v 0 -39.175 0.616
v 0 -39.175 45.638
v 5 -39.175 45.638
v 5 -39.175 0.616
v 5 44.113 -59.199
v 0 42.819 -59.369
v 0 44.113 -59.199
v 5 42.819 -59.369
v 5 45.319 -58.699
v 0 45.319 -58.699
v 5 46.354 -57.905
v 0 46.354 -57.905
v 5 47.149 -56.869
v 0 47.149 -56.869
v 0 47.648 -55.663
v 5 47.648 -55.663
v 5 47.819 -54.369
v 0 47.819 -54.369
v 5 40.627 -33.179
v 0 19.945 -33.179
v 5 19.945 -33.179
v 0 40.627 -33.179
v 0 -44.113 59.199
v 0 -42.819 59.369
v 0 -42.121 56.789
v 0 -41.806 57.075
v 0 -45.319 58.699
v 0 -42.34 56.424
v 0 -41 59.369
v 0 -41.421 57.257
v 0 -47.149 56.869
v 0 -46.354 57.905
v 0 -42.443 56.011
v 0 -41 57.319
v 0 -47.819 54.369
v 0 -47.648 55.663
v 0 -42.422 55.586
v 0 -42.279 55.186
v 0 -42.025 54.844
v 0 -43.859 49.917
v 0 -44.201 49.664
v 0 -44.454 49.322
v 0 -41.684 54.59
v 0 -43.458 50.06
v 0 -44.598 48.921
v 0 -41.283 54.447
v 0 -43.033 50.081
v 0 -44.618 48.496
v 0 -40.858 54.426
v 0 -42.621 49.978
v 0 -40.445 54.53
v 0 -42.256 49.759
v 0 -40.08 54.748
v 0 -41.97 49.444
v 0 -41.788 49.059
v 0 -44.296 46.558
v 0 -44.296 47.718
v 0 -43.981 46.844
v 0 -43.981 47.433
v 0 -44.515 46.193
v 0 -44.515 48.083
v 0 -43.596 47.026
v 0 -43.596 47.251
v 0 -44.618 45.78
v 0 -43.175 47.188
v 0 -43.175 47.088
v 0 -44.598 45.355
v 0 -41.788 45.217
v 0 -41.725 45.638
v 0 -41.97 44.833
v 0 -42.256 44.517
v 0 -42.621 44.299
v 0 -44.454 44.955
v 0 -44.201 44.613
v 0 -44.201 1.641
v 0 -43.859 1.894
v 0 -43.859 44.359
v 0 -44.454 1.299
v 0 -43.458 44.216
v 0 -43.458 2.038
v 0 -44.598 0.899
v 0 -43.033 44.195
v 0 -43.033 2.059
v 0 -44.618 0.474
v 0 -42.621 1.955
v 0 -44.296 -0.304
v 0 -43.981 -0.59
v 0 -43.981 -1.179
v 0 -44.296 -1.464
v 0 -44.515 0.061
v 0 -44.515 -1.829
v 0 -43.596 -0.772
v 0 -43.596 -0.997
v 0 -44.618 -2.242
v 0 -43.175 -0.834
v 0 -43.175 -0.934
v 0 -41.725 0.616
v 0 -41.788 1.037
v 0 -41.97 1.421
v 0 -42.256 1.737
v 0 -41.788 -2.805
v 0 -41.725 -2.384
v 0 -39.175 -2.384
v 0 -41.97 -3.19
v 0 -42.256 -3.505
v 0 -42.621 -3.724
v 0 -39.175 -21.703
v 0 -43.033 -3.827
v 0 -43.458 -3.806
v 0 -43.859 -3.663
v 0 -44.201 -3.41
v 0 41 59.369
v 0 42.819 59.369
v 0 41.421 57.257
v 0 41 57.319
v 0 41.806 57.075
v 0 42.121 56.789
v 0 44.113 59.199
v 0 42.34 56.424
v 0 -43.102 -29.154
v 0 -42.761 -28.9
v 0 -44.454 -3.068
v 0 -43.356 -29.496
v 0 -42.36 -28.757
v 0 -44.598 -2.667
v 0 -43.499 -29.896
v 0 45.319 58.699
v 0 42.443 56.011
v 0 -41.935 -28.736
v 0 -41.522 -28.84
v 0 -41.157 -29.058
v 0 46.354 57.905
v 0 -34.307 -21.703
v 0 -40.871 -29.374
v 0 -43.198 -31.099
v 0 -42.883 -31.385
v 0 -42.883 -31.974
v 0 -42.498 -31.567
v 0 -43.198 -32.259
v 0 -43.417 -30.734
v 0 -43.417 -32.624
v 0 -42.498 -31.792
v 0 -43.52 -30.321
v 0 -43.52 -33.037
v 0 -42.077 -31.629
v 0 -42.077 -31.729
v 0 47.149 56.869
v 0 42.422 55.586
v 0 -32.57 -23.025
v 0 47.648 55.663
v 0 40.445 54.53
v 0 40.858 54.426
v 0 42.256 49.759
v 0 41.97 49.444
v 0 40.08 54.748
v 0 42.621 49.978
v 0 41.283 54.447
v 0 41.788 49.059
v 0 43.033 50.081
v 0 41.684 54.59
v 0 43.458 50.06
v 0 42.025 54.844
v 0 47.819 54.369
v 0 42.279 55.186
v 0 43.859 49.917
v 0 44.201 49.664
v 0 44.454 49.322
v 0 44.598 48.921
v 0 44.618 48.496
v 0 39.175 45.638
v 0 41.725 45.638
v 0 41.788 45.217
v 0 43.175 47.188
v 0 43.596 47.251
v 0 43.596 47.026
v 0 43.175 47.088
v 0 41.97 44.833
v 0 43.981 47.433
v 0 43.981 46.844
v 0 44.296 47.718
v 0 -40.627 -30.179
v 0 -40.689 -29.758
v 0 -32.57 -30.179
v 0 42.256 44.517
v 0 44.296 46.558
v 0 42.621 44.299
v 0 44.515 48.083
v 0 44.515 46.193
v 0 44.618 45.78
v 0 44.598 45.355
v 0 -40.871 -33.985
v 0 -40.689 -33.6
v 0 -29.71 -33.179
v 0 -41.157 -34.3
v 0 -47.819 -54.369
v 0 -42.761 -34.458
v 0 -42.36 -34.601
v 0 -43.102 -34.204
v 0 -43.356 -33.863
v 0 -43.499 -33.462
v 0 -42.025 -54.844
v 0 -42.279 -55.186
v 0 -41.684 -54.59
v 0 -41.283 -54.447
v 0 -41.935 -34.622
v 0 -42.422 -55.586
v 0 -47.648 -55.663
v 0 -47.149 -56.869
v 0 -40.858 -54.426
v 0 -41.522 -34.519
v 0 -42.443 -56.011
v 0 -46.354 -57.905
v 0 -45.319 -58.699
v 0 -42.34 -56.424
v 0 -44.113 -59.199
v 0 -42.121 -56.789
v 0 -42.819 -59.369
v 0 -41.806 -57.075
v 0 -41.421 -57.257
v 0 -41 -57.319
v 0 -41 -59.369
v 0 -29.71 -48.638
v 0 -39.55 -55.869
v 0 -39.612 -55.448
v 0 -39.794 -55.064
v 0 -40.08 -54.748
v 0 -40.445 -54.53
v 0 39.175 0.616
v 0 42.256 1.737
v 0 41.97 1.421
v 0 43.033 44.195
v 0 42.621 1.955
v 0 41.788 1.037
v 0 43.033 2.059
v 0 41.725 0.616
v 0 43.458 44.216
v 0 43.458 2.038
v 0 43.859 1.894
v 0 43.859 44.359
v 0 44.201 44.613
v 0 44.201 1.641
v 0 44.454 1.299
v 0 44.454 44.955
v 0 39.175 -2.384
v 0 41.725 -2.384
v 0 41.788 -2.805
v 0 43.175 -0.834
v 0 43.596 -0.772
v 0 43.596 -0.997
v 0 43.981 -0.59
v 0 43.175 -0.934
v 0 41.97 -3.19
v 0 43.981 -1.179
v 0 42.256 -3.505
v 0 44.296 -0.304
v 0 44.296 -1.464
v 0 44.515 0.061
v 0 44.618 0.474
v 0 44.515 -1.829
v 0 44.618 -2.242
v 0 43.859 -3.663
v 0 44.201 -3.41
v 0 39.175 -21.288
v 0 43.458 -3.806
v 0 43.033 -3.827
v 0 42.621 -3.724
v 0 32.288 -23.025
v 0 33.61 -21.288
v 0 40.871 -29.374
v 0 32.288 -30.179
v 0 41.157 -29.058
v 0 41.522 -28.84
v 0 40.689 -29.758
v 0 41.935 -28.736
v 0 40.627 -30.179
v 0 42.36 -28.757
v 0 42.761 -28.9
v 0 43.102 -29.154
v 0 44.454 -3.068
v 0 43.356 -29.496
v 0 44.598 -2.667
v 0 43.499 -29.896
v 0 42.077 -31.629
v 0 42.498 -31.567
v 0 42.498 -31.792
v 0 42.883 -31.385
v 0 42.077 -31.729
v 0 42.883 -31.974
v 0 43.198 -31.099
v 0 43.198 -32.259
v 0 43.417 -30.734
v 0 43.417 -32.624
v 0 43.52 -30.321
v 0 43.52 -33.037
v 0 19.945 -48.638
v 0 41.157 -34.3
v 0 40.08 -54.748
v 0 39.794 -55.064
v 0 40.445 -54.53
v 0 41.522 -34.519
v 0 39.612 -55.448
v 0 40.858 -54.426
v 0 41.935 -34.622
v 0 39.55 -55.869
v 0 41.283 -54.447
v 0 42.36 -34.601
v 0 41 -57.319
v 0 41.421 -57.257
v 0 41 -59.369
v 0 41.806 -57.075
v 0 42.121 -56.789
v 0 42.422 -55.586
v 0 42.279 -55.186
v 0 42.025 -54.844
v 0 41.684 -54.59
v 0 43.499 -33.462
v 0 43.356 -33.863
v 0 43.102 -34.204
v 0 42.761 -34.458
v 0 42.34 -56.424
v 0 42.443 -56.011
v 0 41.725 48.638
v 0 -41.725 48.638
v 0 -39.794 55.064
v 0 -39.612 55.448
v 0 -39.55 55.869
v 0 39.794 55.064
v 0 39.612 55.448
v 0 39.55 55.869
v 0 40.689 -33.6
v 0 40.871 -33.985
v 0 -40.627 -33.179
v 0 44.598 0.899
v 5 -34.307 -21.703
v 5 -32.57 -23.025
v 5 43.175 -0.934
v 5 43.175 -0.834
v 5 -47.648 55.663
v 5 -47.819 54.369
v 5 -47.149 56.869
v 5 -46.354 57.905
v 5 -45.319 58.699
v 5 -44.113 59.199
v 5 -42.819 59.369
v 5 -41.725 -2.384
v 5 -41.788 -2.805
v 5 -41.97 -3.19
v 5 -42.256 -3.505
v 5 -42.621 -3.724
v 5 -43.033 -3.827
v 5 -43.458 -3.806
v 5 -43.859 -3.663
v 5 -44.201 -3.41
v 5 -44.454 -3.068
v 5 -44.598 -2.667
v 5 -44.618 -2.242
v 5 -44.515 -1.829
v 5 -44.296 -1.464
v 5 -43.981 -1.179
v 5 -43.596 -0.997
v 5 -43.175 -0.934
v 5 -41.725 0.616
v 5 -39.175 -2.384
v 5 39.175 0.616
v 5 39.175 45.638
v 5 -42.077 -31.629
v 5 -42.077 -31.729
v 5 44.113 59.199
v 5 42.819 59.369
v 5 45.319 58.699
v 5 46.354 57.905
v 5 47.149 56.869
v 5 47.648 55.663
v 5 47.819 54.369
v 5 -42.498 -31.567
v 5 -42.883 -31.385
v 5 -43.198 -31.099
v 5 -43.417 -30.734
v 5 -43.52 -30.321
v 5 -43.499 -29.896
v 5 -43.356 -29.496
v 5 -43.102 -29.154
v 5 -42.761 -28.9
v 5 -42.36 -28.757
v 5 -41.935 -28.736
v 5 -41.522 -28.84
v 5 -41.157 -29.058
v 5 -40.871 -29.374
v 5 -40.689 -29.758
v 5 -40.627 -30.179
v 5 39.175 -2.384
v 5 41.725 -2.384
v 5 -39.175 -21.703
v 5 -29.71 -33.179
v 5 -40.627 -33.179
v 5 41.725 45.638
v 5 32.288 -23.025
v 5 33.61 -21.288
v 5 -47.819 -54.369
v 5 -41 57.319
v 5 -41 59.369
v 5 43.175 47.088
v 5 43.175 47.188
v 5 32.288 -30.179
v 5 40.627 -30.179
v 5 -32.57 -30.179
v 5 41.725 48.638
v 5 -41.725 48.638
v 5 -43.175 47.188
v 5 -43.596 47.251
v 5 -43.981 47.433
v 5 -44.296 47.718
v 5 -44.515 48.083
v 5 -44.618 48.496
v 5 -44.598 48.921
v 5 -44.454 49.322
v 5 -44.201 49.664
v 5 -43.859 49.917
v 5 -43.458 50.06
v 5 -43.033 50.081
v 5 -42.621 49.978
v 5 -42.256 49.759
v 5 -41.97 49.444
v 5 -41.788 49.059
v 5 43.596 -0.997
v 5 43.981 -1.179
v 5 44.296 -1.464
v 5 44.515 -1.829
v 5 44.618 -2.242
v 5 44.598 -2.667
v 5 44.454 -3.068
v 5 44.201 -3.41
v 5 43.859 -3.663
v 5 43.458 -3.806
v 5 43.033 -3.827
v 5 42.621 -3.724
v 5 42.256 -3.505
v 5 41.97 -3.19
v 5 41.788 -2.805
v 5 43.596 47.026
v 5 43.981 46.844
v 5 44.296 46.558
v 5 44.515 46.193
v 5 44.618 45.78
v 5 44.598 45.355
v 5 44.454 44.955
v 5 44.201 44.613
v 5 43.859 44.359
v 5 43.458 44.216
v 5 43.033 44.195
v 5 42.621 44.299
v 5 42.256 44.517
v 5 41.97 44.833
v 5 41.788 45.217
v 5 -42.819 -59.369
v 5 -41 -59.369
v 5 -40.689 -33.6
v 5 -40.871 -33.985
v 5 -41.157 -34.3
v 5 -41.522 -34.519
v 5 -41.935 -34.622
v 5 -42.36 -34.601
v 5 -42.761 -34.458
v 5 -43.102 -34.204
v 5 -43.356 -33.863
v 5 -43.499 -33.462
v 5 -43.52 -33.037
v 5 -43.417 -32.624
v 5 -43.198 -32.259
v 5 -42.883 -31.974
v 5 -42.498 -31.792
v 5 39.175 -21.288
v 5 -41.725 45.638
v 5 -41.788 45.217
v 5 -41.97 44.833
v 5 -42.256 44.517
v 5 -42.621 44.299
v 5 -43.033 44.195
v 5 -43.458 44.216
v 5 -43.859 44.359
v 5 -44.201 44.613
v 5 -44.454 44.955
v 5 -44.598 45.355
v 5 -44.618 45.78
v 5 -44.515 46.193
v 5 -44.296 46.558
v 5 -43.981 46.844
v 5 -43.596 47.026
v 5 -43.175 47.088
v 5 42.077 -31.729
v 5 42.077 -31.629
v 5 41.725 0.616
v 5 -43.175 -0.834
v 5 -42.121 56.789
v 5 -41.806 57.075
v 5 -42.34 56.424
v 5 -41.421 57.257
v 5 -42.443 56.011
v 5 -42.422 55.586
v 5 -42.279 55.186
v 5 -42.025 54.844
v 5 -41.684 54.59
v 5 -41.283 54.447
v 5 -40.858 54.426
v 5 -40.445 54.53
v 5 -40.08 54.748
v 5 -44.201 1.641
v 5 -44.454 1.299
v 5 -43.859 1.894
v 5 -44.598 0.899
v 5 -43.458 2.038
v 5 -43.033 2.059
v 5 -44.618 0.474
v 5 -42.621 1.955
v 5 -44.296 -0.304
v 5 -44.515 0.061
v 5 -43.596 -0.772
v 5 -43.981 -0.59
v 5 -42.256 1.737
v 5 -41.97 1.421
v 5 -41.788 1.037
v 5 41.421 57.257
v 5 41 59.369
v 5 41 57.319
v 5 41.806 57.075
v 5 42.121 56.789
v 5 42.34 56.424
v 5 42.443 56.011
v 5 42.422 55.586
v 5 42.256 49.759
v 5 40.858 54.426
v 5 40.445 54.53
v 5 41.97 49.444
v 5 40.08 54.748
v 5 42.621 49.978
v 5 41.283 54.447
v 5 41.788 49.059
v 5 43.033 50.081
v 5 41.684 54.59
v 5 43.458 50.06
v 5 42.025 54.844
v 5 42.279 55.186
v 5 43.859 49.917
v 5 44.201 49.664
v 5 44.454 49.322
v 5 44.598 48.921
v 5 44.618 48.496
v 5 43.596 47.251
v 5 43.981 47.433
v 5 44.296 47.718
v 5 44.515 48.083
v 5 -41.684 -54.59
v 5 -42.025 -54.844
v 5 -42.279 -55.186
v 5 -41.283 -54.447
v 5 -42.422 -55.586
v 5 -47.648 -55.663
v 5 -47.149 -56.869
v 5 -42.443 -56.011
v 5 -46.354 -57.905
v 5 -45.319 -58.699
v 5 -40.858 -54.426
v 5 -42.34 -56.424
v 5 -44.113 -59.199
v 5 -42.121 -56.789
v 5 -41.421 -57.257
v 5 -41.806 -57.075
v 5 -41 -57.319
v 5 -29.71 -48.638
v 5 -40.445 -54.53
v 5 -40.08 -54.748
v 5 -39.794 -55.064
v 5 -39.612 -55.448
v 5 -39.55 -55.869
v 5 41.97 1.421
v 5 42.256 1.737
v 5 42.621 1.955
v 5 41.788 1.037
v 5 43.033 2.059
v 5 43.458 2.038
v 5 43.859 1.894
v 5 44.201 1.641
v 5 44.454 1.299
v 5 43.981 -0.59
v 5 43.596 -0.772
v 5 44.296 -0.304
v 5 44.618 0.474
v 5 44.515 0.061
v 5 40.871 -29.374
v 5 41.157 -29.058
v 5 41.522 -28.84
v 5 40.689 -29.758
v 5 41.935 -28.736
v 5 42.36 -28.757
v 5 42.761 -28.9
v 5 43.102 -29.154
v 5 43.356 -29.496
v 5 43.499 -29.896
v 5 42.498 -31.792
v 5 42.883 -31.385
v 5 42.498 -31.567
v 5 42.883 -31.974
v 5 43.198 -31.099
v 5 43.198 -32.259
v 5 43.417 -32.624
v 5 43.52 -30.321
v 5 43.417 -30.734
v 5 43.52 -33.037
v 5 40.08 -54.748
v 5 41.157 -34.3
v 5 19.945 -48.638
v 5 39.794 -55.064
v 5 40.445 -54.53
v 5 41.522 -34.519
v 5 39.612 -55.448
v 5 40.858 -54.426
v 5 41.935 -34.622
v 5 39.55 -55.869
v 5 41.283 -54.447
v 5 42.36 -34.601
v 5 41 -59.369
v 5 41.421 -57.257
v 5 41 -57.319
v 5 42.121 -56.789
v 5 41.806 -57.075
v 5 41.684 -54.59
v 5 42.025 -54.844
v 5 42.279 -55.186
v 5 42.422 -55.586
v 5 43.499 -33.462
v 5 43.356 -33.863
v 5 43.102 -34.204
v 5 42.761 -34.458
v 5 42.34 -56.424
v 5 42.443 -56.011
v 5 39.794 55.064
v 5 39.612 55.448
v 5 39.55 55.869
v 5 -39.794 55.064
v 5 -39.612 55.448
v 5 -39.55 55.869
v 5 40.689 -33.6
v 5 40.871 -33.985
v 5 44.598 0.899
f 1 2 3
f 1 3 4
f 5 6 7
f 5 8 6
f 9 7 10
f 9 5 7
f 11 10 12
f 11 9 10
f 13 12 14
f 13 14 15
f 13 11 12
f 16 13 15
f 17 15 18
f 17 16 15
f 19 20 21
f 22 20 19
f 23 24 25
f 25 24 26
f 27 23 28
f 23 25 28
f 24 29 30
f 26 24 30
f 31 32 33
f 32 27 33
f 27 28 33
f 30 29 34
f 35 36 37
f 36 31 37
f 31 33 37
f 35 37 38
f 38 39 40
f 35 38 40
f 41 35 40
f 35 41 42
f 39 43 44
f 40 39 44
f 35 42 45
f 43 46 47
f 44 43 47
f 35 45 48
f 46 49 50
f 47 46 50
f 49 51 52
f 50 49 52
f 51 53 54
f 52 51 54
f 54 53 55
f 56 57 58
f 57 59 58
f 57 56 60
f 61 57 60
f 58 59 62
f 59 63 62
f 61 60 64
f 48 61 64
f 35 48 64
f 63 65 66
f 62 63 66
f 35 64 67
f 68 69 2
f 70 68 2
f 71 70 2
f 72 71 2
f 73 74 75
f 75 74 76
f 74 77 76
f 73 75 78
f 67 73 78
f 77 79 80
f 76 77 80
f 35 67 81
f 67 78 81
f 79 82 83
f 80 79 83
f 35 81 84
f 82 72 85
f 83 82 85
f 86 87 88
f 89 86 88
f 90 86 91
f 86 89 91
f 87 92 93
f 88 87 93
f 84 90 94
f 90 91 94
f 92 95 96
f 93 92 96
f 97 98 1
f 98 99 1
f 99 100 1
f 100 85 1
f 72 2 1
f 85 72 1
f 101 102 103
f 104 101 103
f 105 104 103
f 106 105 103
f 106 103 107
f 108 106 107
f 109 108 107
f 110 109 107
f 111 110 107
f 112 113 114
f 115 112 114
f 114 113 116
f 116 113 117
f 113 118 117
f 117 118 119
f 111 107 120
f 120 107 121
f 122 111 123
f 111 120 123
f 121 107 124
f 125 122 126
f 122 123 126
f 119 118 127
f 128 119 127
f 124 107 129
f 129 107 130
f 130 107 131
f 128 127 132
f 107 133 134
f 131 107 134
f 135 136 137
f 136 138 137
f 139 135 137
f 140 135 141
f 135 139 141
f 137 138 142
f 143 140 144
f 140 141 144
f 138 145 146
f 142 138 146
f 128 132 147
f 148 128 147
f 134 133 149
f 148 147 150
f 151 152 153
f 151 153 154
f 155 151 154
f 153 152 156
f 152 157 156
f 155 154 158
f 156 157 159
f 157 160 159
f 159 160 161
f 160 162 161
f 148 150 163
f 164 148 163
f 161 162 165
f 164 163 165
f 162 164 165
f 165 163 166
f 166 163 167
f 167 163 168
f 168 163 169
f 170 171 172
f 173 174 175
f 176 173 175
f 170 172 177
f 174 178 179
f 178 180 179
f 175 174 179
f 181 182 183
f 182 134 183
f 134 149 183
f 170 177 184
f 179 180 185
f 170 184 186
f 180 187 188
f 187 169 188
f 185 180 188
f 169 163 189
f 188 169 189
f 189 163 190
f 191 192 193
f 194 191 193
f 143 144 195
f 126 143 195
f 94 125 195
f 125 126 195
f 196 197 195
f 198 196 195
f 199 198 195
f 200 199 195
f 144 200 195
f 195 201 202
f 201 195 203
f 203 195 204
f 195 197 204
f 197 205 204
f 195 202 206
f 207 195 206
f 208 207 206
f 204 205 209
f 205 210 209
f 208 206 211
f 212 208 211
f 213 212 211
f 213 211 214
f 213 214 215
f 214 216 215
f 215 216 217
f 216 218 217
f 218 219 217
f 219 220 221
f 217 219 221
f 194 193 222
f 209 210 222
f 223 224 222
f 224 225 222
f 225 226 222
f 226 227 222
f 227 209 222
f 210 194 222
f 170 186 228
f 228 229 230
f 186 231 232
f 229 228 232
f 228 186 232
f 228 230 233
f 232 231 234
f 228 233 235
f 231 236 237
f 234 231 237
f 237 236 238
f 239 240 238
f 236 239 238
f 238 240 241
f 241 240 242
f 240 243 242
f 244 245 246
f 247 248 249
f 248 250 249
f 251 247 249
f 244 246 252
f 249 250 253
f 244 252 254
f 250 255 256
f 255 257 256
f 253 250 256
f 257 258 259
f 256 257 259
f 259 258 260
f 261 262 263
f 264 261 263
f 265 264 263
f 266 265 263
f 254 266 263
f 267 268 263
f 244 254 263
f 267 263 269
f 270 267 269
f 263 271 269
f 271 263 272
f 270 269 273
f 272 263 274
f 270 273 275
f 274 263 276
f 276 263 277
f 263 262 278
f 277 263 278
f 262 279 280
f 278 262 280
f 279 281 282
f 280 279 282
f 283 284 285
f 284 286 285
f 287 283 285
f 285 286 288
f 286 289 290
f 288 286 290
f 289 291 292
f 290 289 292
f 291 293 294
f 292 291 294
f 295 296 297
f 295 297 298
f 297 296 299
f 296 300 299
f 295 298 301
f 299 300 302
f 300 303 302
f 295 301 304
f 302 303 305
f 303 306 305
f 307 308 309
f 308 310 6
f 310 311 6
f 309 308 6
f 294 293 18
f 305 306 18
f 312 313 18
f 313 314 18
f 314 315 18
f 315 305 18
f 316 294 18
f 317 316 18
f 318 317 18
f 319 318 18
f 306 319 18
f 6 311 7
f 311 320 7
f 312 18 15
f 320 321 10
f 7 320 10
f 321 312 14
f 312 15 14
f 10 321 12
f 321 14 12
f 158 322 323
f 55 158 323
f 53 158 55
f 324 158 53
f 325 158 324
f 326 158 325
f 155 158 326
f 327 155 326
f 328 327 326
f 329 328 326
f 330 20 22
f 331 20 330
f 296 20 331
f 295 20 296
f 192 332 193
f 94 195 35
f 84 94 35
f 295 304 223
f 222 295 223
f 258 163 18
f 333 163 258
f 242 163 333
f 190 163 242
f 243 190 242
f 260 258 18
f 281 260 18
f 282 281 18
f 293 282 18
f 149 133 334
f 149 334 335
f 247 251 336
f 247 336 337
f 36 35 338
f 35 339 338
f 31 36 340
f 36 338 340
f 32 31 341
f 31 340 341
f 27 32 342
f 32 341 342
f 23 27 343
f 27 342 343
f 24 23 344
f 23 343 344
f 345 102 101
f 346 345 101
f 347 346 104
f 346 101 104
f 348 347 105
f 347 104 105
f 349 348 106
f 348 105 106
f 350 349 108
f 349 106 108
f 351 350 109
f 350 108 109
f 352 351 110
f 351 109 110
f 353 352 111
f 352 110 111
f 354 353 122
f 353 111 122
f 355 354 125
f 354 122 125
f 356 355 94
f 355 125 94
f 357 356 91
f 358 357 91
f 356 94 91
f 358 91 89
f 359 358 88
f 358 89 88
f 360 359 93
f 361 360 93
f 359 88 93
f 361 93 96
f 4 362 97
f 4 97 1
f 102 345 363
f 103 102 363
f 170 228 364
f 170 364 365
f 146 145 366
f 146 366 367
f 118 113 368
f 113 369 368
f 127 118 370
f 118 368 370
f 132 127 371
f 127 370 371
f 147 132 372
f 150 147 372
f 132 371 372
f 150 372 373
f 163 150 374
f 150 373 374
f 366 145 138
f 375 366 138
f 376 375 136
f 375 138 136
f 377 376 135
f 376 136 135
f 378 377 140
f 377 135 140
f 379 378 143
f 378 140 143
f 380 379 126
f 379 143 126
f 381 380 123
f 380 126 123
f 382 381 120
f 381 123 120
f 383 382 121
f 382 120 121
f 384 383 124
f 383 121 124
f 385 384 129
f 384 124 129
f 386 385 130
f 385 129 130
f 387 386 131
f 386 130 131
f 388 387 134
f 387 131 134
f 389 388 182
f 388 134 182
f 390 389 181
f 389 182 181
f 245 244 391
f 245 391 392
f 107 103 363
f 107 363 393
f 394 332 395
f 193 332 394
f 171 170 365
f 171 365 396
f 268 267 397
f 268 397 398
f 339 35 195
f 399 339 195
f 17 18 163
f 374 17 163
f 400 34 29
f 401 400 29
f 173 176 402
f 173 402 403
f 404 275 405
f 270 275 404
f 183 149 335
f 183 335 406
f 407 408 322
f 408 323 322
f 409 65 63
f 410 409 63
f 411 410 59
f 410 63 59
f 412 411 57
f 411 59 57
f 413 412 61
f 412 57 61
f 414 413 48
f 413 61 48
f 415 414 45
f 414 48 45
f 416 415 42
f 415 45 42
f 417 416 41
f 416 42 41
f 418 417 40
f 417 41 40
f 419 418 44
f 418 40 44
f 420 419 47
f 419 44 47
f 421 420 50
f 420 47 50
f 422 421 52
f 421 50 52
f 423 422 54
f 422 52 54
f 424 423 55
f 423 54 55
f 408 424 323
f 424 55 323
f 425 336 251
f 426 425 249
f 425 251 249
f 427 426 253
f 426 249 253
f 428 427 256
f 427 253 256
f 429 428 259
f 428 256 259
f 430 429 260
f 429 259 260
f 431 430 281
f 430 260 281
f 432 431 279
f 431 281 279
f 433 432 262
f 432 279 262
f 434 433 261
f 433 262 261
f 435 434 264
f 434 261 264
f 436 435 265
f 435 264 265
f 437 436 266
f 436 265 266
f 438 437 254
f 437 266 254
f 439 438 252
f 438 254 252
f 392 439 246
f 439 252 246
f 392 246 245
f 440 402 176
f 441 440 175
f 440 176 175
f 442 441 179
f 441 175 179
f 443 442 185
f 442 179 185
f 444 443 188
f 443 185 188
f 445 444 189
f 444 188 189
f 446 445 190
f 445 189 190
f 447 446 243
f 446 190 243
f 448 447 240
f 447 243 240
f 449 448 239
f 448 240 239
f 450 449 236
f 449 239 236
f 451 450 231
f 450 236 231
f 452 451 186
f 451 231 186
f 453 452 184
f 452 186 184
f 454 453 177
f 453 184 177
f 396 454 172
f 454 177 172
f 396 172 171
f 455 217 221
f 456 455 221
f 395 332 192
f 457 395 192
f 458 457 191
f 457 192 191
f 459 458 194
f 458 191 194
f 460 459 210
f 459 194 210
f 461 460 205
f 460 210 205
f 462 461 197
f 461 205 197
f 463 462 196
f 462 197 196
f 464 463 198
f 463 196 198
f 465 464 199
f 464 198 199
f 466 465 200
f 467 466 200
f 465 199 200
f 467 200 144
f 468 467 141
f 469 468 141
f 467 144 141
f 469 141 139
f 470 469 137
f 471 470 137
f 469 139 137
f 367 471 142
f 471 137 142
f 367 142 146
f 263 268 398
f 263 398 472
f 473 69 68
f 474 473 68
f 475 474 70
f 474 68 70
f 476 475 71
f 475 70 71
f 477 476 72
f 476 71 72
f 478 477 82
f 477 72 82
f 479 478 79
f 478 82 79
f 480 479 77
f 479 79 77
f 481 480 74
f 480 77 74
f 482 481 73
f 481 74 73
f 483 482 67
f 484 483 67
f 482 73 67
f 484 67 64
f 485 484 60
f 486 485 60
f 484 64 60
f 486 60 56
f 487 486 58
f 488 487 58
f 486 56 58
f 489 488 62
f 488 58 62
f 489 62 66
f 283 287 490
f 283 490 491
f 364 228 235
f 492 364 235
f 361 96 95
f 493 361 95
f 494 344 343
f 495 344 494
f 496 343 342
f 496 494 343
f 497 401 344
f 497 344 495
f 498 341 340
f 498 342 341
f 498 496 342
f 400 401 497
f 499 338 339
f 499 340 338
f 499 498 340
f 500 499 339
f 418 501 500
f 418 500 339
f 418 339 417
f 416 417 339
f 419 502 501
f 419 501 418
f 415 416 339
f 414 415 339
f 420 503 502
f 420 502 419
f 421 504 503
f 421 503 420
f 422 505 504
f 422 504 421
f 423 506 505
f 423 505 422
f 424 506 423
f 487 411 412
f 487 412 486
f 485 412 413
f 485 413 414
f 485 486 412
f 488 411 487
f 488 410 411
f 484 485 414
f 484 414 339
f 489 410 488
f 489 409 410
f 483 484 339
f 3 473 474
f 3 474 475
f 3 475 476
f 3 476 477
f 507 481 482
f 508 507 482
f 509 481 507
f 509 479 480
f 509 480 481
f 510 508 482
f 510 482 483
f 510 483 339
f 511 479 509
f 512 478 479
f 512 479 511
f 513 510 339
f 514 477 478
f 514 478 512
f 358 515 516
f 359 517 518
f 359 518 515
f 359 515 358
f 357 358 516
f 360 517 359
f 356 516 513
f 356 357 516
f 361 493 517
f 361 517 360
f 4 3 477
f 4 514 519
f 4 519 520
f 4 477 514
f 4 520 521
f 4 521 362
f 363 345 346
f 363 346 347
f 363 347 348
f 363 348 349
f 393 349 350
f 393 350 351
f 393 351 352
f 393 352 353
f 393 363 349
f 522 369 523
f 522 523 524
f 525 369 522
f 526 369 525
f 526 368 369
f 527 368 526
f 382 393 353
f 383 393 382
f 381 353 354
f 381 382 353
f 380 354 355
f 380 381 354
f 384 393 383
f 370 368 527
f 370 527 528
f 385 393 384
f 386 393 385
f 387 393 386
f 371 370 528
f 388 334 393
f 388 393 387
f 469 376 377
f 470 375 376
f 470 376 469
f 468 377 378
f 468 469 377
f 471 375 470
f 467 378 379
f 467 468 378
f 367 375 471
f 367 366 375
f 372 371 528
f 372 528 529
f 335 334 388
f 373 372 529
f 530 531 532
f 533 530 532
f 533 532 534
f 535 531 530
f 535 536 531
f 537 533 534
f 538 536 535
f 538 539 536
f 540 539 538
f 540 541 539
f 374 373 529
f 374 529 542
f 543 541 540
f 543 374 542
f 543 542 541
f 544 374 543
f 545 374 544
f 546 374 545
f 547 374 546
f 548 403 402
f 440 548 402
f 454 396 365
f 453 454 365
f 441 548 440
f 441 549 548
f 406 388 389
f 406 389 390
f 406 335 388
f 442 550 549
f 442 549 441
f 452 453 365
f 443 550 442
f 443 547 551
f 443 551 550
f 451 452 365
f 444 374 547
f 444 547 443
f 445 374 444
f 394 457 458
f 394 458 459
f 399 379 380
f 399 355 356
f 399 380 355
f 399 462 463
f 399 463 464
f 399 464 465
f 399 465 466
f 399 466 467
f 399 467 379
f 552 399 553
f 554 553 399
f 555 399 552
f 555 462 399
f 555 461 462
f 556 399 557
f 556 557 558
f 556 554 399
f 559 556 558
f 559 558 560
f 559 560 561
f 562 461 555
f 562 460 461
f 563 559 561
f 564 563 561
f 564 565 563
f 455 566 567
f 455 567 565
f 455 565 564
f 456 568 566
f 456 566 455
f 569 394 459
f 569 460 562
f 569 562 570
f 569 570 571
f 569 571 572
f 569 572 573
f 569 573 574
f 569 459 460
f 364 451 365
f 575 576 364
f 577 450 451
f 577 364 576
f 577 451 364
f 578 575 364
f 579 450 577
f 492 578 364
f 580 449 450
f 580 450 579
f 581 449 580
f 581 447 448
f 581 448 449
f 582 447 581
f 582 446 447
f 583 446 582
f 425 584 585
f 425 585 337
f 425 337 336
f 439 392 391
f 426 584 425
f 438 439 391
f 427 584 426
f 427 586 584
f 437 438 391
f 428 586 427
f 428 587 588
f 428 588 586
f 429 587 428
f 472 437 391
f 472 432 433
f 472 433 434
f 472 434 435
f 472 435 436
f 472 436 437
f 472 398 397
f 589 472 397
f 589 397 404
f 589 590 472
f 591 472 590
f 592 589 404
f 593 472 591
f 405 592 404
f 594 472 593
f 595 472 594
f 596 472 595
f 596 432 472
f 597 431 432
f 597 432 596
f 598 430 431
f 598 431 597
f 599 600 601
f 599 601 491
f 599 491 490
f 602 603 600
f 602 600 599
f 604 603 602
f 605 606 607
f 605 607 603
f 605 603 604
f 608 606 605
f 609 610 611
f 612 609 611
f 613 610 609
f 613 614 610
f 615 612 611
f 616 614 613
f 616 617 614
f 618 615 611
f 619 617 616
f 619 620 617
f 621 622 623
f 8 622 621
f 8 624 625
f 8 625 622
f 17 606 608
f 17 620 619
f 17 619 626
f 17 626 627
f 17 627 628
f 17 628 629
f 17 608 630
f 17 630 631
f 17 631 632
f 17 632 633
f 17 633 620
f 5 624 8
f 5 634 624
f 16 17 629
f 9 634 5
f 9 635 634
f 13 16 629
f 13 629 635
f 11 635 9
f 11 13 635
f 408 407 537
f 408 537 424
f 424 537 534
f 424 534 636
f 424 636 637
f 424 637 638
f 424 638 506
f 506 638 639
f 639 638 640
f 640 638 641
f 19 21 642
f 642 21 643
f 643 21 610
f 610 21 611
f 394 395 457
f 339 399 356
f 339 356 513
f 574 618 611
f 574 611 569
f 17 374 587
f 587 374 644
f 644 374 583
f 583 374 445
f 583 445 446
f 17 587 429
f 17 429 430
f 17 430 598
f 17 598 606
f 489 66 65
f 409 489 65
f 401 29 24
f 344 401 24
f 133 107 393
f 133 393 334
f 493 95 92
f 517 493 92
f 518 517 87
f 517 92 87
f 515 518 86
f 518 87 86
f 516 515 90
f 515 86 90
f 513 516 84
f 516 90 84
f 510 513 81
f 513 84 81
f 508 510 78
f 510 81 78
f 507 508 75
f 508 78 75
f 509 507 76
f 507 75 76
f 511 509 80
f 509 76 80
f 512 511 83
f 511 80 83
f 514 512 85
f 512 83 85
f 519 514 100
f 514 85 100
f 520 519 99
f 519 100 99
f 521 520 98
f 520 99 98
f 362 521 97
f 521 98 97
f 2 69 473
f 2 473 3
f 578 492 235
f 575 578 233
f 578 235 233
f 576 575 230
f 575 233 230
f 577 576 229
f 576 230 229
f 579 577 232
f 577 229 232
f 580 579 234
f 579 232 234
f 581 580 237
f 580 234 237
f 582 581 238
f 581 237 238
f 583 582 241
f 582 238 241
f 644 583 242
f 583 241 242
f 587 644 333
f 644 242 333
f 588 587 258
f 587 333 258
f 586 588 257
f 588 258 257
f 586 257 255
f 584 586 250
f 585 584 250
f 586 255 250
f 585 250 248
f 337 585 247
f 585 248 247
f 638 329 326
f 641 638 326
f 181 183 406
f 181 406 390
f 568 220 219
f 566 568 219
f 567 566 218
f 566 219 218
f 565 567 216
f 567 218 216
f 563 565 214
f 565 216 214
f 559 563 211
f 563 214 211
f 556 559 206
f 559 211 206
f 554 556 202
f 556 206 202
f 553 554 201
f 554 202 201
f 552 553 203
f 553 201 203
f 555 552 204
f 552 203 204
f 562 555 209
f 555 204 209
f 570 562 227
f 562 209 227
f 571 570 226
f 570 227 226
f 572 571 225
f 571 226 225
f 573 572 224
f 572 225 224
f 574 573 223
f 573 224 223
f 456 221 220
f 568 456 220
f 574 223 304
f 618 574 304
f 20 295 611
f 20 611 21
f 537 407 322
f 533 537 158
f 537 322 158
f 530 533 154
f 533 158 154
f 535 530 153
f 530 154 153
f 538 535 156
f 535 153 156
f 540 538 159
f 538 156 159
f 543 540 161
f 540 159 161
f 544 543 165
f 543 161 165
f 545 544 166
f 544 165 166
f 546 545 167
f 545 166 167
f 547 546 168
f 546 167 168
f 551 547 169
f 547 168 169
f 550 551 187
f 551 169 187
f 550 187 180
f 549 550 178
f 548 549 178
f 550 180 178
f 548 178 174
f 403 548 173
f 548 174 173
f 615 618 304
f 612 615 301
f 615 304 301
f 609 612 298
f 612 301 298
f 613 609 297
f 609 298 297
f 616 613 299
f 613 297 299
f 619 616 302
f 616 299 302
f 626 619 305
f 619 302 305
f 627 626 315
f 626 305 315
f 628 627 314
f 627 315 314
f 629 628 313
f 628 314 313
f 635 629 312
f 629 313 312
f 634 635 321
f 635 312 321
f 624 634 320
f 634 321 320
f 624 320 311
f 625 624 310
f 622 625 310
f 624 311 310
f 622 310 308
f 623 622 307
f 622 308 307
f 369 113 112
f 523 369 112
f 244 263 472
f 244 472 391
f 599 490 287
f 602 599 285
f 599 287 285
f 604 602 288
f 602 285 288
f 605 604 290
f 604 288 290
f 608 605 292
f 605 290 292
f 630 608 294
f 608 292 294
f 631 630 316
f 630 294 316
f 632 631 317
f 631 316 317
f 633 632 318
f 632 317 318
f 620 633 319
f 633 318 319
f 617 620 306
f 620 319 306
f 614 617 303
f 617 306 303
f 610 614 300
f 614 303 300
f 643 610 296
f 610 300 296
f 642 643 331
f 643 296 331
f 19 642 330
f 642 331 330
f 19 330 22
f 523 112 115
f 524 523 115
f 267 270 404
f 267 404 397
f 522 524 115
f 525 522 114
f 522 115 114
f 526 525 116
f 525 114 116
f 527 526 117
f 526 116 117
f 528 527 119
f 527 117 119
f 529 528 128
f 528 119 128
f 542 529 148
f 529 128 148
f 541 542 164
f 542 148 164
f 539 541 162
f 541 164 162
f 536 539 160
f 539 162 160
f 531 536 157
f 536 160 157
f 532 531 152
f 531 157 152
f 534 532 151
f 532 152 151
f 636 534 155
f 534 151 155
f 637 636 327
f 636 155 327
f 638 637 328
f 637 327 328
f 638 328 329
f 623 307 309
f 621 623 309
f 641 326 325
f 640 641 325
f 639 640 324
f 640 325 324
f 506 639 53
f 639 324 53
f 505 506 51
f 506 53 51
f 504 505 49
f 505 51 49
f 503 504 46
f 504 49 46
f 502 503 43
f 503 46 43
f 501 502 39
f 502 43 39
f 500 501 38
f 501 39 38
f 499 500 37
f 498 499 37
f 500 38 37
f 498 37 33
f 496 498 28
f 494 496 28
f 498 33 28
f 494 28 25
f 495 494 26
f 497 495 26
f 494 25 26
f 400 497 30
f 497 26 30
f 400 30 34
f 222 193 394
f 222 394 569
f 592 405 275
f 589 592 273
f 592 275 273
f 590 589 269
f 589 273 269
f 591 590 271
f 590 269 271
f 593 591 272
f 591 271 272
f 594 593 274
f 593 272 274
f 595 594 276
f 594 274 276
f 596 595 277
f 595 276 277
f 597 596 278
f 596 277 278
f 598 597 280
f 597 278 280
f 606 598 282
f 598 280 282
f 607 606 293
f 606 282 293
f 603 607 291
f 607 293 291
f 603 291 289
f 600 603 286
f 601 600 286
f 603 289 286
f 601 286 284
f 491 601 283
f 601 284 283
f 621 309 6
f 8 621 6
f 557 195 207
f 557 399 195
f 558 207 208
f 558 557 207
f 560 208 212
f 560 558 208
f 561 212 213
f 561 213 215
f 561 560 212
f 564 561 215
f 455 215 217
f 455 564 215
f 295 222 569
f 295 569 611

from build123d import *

# Parameters (mm, degrees)
BOSS_EXTRUDE1_DEPTH = 5
FILLET1_R           = 5
CUT_EXTRUDE1_REACH  = 7
SKETCH2_W           = 3
SKETCH2_H           = 4
CUT_EXTRUDE2_REACH  = 7
SKETCH3_R           = 1.45


with BuildPart() as part:
    # Sketch1 → Boss-Extrude1 (new body)
    with BuildSketch(Plane(origin=(0, 0, 0), x_dir=(0, 0, -1), z_dir=(1, 0, 0))):
        Polygon((-59.36916415, -47.818646587), (0, -47.818646587), (59.36916415, -47.818646587), (59.36916415, -41), (55.86916415, -41), (55.86916415, 41), (59.36916415, 41), (59.36916415, 47.818646587), (-59.36916415, 47.818646587), (-59.36916415, 41), (-55.86916415, 41), (-55.86916415, -41), (-59.36916415, -41), align=None)
        Polygon((21.702610628, -39.175443067), (21.702610628, -34.307045578), (23.024909313, -32.569779859), (30.179141539, -32.569779859), (30.179141539, -42.076978078), (33.179141539, -42.076978078), (33.179141539, -29.710380013), (48.63820865, -29.710380013), (48.63820865, 19.945173818), (33.179141539, 19.945173818), (33.179141539, 42.076978078), (30.179141539, 42.076978078), (30.179141539, 32.288188968), (23.024909313, 32.288188968), (21.287643594, 33.610487654), (21.287643594, 39.175443067), (-48.63820865, 39.175443067), (-48.63820865, -39.175443067), align=None, mode=Mode.SUBTRACT)
    extrude(amount=BOSS_EXTRUDE1_DEPTH)

    # Fillet1
    fillet1_edges = [part.edges().sort_by_distance(p)[0] for p in [
        (2.5, -47.818646587, -59.36916415),
        (2.5, -47.818646587, 59.36916415),
        (2.5, 47.818646587, 59.36916415),
        (2.5, 47.818646587, -59.36916415),
    ]]
    fillet(fillet1_edges, radius=FILLET1_R)

    # Sketch2 → Cut-Extrude1 (cut, up to next)
    with BuildSketch(Plane.ZY, mode=Mode.PRIVATE) as cut_extrude1_sk1:
        with Locations((47.13820865, 41.175443067)):
            Rectangle(SKETCH2_W, SKETCH2_H)
    cut_extrude1_tool1 = extrude(cut_extrude1_sk1.sketch, amount=-CUT_EXTRUDE1_REACH, mode=Mode.PRIVATE) & part.part
    add(cut_extrude1_tool1.solids().sort_by_distance((0, 41.175443, 47.138209))[0], mode=Mode.SUBTRACT)
    # Sketch2 → Cut-Extrude1 (cut, up to next)
    with BuildSketch(Plane.ZY, mode=Mode.PRIVATE) as cut_extrude1_sk2:
        with Locations((47.13820865, -41.175443067)):
            Rectangle(SKETCH2_W, SKETCH2_H)
    cut_extrude1_tool2 = extrude(cut_extrude1_sk2.sketch, amount=-CUT_EXTRUDE1_REACH, mode=Mode.PRIVATE) & part.part
    add(cut_extrude1_tool2.solids().sort_by_distance((0, -41.175443, 47.138209))[0], mode=Mode.SUBTRACT)
    # Sketch2 → Cut-Extrude1 (cut, up to next)
    with BuildSketch(Plane.ZY, mode=Mode.PRIVATE) as cut_extrude1_sk3:
        with Locations((-0.884341096, -41.175443067)):
            Rectangle(SKETCH2_W, SKETCH2_H)
    cut_extrude1_tool3 = extrude(cut_extrude1_sk3.sketch, amount=-CUT_EXTRUDE1_REACH, mode=Mode.PRIVATE) & part.part
    add(cut_extrude1_tool3.solids().sort_by_distance((0, -41.175443, -0.884341))[0], mode=Mode.SUBTRACT)
    # Sketch2 → Cut-Extrude1 (cut, up to next)
    with BuildSketch(Plane.ZY, mode=Mode.PRIVATE) as cut_extrude1_sk4:
        with Locations((-0.884341096, 41.175443067)):
            Rectangle(SKETCH2_W, SKETCH2_H)
    cut_extrude1_tool4 = extrude(cut_extrude1_sk4.sketch, amount=-CUT_EXTRUDE1_REACH, mode=Mode.PRIVATE) & part.part
    add(cut_extrude1_tool4.solids().sort_by_distance((0, 41.175443, -0.884341))[0], mode=Mode.SUBTRACT)

    # Sketch3 → Cut-Extrude2 (cut, up to next)
    with BuildSketch(Plane.ZY, mode=Mode.PRIVATE) as cut_extrude2_sk1:
        with Locations((-33.179141539, 42.076978078)):
            Circle(SKETCH3_R)
    cut_extrude2_tool1 = extrude(cut_extrude2_sk1.sketch, amount=-CUT_EXTRUDE2_REACH, mode=Mode.PRIVATE) & part.part
    add(cut_extrude2_tool1.solids().sort_by_distance((0, 42.076978, -33.179142))[0], mode=Mode.SUBTRACT)
    # Sketch3 → Cut-Extrude2 (cut, up to next)
    with BuildSketch(Plane.ZY, mode=Mode.PRIVATE) as cut_extrude2_sk2:
        with Locations((-30.179141539, 42.076978078)):
            Circle(SKETCH3_R)
    cut_extrude2_tool2 = extrude(cut_extrude2_sk2.sketch, amount=-CUT_EXTRUDE2_REACH, mode=Mode.PRIVATE) & part.part
    add(cut_extrude2_tool2.solids().sort_by_distance((0, 42.076978, -30.179142))[0], mode=Mode.SUBTRACT)
    # Sketch3 → Cut-Extrude2 (cut, up to next)
    with BuildSketch(Plane.ZY, mode=Mode.PRIVATE) as cut_extrude2_sk3:
        with Locations((-2.384341096, 43.175443067)):
            Circle(SKETCH3_R)
    cut_extrude2_tool3 = extrude(cut_extrude2_sk3.sketch, amount=-CUT_EXTRUDE2_REACH, mode=Mode.PRIVATE) & part.part
    add(cut_extrude2_tool3.solids().sort_by_distance((0, 43.175443, -2.384341))[0], mode=Mode.SUBTRACT)
    # Sketch3 → Cut-Extrude2 (cut, up to next)
    with BuildSketch(Plane.ZY, mode=Mode.PRIVATE) as cut_extrude2_sk4:
        with Locations((0.615658904, 43.175443067)):
            Circle(SKETCH3_R)
    cut_extrude2_tool4 = extrude(cut_extrude2_sk4.sketch, amount=-CUT_EXTRUDE2_REACH, mode=Mode.PRIVATE) & part.part
    add(cut_extrude2_tool4.solids().sort_by_distance((0, 43.175443, 0.615659))[0], mode=Mode.SUBTRACT)
    # Sketch3 → Cut-Extrude2 (cut, up to next)
    with BuildSketch(Plane.ZY, mode=Mode.PRIVATE) as cut_extrude2_sk5:
        with Locations((-55.86916415, 41)):
            Circle(SKETCH3_R)
    cut_extrude2_tool5 = extrude(cut_extrude2_sk5.sketch, amount=-CUT_EXTRUDE2_REACH, mode=Mode.PRIVATE) & part.part
    add(cut_extrude2_tool5.solids().sort_by_distance((0, 41, -55.869164))[0], mode=Mode.SUBTRACT)
    # Sketch3 → Cut-Extrude2 (cut, up to next)
    with BuildSketch(Plane.ZY, mode=Mode.PRIVATE) as cut_extrude2_sk6:
        with Locations((45.63820865, 43.175443067)):
            Circle(SKETCH3_R)
    cut_extrude2_tool6 = extrude(cut_extrude2_sk6.sketch, amount=-CUT_EXTRUDE2_REACH, mode=Mode.PRIVATE) & part.part
    add(cut_extrude2_tool6.solids().sort_by_distance((0, 43.175443, 45.638209))[0], mode=Mode.SUBTRACT)
    # Sketch3 → Cut-Extrude2 (cut, up to next)
    with BuildSketch(Plane.ZY, mode=Mode.PRIVATE) as cut_extrude2_sk7:
        with Locations((48.63820865, 43.175443067)):
            Circle(SKETCH3_R)
    cut_extrude2_tool7 = extrude(cut_extrude2_sk7.sketch, amount=-CUT_EXTRUDE2_REACH, mode=Mode.PRIVATE) & part.part
    add(cut_extrude2_tool7.solids().sort_by_distance((0, 43.175443, 48.638209))[0], mode=Mode.SUBTRACT)
    # Sketch3 → Cut-Extrude2 (cut, up to next)
    with BuildSketch(Plane.ZY, mode=Mode.PRIVATE) as cut_extrude2_sk8:
        with Locations((48.63820865, -43.175443067)):
            Circle(SKETCH3_R)
    cut_extrude2_tool8 = extrude(cut_extrude2_sk8.sketch, amount=-CUT_EXTRUDE2_REACH, mode=Mode.PRIVATE) & part.part
    add(cut_extrude2_tool8.solids().sort_by_distance((0, -43.175443, 48.638209))[0], mode=Mode.SUBTRACT)
    # Sketch3 → Cut-Extrude2 (cut, up to next)
    with BuildSketch(Plane.ZY, mode=Mode.PRIVATE) as cut_extrude2_sk9:
        with Locations((45.63820865, -43.175443067)):
            Circle(SKETCH3_R)
    cut_extrude2_tool9 = extrude(cut_extrude2_sk9.sketch, amount=-CUT_EXTRUDE2_REACH, mode=Mode.PRIVATE) & part.part
    add(cut_extrude2_tool9.solids().sort_by_distance((0, -43.175443, 45.638209))[0], mode=Mode.SUBTRACT)
    # Sketch3 → Cut-Extrude2 (cut, up to next)
    with BuildSketch(Plane.ZY, mode=Mode.PRIVATE) as cut_extrude2_sk10:
        with Locations((0.615658904, -43.175443067)):
            Circle(SKETCH3_R)
    cut_extrude2_tool10 = extrude(cut_extrude2_sk10.sketch, amount=-CUT_EXTRUDE2_REACH, mode=Mode.PRIVATE) & part.part
    add(cut_extrude2_tool10.solids().sort_by_distance((0, -43.175443, 0.615659))[0], mode=Mode.SUBTRACT)
    # Sketch3 → Cut-Extrude2 (cut, up to next)
    with BuildSketch(Plane.ZY, mode=Mode.PRIVATE) as cut_extrude2_sk11:
        with Locations((-2.384341096, -43.175443067)):
            Circle(SKETCH3_R)
    cut_extrude2_tool11 = extrude(cut_extrude2_sk11.sketch, amount=-CUT_EXTRUDE2_REACH, mode=Mode.PRIVATE) & part.part
    add(cut_extrude2_tool11.solids().sort_by_distance((0, -43.175443, -2.384341))[0], mode=Mode.SUBTRACT)
    # Sketch3 → Cut-Extrude2 (cut, up to next)
    with BuildSketch(Plane.ZY, mode=Mode.PRIVATE) as cut_extrude2_sk12:
        with Locations((-30.179141539, -42.076978078)):
            Circle(SKETCH3_R)
    cut_extrude2_tool12 = extrude(cut_extrude2_sk12.sketch, amount=-CUT_EXTRUDE2_REACH, mode=Mode.PRIVATE) & part.part
    add(cut_extrude2_tool12.solids().sort_by_distance((0, -42.076978, -30.179142))[0], mode=Mode.SUBTRACT)
    # Sketch3 → Cut-Extrude2 (cut, up to next)
    with BuildSketch(Plane.ZY, mode=Mode.PRIVATE) as cut_extrude2_sk13:
        with Locations((-33.179141539, -42.076978078)):
            Circle(SKETCH3_R)
    cut_extrude2_tool13 = extrude(cut_extrude2_sk13.sketch, amount=-CUT_EXTRUDE2_REACH, mode=Mode.PRIVATE) & part.part
    add(cut_extrude2_tool13.solids().sort_by_distance((0, -42.076978, -33.179142))[0], mode=Mode.SUBTRACT)
    # Sketch3 → Cut-Extrude2 (cut, up to next)
    with BuildSketch(Plane.ZY, mode=Mode.PRIVATE) as cut_extrude2_sk14:
        with Locations((-55.86916415, -41)):
            Circle(SKETCH3_R)
    cut_extrude2_tool14 = extrude(cut_extrude2_sk14.sketch, amount=-CUT_EXTRUDE2_REACH, mode=Mode.PRIVATE) & part.part
    add(cut_extrude2_tool14.solids().sort_by_distance((0, -41, -55.869164))[0], mode=Mode.SUBTRACT)
    # Sketch3 → Cut-Extrude2 (cut, up to next)
    with BuildSketch(Plane.ZY, mode=Mode.PRIVATE) as cut_extrude2_sk15:
        with Locations((55.86916415, -41)):
            Circle(SKETCH3_R)
    cut_extrude2_tool15 = extrude(cut_extrude2_sk15.sketch, amount=-CUT_EXTRUDE2_REACH, mode=Mode.PRIVATE) & part.part
    add(cut_extrude2_tool15.solids().sort_by_distance((0, -41, 55.869164))[0], mode=Mode.SUBTRACT)
    # Sketch3 → Cut-Extrude2 (cut, up to next)
    with BuildSketch(Plane.ZY, mode=Mode.PRIVATE) as cut_extrude2_sk16:
        with Locations((55.86916415, 41)):
            Circle(SKETCH3_R)
    cut_extrude2_tool16 = extrude(cut_extrude2_sk16.sketch, amount=-CUT_EXTRUDE2_REACH, mode=Mode.PRIVATE) & part.part
    add(cut_extrude2_tool16.solids().sort_by_distance((0, 41, 55.869164))[0], mode=Mode.SUBTRACT)


solid = part.part
